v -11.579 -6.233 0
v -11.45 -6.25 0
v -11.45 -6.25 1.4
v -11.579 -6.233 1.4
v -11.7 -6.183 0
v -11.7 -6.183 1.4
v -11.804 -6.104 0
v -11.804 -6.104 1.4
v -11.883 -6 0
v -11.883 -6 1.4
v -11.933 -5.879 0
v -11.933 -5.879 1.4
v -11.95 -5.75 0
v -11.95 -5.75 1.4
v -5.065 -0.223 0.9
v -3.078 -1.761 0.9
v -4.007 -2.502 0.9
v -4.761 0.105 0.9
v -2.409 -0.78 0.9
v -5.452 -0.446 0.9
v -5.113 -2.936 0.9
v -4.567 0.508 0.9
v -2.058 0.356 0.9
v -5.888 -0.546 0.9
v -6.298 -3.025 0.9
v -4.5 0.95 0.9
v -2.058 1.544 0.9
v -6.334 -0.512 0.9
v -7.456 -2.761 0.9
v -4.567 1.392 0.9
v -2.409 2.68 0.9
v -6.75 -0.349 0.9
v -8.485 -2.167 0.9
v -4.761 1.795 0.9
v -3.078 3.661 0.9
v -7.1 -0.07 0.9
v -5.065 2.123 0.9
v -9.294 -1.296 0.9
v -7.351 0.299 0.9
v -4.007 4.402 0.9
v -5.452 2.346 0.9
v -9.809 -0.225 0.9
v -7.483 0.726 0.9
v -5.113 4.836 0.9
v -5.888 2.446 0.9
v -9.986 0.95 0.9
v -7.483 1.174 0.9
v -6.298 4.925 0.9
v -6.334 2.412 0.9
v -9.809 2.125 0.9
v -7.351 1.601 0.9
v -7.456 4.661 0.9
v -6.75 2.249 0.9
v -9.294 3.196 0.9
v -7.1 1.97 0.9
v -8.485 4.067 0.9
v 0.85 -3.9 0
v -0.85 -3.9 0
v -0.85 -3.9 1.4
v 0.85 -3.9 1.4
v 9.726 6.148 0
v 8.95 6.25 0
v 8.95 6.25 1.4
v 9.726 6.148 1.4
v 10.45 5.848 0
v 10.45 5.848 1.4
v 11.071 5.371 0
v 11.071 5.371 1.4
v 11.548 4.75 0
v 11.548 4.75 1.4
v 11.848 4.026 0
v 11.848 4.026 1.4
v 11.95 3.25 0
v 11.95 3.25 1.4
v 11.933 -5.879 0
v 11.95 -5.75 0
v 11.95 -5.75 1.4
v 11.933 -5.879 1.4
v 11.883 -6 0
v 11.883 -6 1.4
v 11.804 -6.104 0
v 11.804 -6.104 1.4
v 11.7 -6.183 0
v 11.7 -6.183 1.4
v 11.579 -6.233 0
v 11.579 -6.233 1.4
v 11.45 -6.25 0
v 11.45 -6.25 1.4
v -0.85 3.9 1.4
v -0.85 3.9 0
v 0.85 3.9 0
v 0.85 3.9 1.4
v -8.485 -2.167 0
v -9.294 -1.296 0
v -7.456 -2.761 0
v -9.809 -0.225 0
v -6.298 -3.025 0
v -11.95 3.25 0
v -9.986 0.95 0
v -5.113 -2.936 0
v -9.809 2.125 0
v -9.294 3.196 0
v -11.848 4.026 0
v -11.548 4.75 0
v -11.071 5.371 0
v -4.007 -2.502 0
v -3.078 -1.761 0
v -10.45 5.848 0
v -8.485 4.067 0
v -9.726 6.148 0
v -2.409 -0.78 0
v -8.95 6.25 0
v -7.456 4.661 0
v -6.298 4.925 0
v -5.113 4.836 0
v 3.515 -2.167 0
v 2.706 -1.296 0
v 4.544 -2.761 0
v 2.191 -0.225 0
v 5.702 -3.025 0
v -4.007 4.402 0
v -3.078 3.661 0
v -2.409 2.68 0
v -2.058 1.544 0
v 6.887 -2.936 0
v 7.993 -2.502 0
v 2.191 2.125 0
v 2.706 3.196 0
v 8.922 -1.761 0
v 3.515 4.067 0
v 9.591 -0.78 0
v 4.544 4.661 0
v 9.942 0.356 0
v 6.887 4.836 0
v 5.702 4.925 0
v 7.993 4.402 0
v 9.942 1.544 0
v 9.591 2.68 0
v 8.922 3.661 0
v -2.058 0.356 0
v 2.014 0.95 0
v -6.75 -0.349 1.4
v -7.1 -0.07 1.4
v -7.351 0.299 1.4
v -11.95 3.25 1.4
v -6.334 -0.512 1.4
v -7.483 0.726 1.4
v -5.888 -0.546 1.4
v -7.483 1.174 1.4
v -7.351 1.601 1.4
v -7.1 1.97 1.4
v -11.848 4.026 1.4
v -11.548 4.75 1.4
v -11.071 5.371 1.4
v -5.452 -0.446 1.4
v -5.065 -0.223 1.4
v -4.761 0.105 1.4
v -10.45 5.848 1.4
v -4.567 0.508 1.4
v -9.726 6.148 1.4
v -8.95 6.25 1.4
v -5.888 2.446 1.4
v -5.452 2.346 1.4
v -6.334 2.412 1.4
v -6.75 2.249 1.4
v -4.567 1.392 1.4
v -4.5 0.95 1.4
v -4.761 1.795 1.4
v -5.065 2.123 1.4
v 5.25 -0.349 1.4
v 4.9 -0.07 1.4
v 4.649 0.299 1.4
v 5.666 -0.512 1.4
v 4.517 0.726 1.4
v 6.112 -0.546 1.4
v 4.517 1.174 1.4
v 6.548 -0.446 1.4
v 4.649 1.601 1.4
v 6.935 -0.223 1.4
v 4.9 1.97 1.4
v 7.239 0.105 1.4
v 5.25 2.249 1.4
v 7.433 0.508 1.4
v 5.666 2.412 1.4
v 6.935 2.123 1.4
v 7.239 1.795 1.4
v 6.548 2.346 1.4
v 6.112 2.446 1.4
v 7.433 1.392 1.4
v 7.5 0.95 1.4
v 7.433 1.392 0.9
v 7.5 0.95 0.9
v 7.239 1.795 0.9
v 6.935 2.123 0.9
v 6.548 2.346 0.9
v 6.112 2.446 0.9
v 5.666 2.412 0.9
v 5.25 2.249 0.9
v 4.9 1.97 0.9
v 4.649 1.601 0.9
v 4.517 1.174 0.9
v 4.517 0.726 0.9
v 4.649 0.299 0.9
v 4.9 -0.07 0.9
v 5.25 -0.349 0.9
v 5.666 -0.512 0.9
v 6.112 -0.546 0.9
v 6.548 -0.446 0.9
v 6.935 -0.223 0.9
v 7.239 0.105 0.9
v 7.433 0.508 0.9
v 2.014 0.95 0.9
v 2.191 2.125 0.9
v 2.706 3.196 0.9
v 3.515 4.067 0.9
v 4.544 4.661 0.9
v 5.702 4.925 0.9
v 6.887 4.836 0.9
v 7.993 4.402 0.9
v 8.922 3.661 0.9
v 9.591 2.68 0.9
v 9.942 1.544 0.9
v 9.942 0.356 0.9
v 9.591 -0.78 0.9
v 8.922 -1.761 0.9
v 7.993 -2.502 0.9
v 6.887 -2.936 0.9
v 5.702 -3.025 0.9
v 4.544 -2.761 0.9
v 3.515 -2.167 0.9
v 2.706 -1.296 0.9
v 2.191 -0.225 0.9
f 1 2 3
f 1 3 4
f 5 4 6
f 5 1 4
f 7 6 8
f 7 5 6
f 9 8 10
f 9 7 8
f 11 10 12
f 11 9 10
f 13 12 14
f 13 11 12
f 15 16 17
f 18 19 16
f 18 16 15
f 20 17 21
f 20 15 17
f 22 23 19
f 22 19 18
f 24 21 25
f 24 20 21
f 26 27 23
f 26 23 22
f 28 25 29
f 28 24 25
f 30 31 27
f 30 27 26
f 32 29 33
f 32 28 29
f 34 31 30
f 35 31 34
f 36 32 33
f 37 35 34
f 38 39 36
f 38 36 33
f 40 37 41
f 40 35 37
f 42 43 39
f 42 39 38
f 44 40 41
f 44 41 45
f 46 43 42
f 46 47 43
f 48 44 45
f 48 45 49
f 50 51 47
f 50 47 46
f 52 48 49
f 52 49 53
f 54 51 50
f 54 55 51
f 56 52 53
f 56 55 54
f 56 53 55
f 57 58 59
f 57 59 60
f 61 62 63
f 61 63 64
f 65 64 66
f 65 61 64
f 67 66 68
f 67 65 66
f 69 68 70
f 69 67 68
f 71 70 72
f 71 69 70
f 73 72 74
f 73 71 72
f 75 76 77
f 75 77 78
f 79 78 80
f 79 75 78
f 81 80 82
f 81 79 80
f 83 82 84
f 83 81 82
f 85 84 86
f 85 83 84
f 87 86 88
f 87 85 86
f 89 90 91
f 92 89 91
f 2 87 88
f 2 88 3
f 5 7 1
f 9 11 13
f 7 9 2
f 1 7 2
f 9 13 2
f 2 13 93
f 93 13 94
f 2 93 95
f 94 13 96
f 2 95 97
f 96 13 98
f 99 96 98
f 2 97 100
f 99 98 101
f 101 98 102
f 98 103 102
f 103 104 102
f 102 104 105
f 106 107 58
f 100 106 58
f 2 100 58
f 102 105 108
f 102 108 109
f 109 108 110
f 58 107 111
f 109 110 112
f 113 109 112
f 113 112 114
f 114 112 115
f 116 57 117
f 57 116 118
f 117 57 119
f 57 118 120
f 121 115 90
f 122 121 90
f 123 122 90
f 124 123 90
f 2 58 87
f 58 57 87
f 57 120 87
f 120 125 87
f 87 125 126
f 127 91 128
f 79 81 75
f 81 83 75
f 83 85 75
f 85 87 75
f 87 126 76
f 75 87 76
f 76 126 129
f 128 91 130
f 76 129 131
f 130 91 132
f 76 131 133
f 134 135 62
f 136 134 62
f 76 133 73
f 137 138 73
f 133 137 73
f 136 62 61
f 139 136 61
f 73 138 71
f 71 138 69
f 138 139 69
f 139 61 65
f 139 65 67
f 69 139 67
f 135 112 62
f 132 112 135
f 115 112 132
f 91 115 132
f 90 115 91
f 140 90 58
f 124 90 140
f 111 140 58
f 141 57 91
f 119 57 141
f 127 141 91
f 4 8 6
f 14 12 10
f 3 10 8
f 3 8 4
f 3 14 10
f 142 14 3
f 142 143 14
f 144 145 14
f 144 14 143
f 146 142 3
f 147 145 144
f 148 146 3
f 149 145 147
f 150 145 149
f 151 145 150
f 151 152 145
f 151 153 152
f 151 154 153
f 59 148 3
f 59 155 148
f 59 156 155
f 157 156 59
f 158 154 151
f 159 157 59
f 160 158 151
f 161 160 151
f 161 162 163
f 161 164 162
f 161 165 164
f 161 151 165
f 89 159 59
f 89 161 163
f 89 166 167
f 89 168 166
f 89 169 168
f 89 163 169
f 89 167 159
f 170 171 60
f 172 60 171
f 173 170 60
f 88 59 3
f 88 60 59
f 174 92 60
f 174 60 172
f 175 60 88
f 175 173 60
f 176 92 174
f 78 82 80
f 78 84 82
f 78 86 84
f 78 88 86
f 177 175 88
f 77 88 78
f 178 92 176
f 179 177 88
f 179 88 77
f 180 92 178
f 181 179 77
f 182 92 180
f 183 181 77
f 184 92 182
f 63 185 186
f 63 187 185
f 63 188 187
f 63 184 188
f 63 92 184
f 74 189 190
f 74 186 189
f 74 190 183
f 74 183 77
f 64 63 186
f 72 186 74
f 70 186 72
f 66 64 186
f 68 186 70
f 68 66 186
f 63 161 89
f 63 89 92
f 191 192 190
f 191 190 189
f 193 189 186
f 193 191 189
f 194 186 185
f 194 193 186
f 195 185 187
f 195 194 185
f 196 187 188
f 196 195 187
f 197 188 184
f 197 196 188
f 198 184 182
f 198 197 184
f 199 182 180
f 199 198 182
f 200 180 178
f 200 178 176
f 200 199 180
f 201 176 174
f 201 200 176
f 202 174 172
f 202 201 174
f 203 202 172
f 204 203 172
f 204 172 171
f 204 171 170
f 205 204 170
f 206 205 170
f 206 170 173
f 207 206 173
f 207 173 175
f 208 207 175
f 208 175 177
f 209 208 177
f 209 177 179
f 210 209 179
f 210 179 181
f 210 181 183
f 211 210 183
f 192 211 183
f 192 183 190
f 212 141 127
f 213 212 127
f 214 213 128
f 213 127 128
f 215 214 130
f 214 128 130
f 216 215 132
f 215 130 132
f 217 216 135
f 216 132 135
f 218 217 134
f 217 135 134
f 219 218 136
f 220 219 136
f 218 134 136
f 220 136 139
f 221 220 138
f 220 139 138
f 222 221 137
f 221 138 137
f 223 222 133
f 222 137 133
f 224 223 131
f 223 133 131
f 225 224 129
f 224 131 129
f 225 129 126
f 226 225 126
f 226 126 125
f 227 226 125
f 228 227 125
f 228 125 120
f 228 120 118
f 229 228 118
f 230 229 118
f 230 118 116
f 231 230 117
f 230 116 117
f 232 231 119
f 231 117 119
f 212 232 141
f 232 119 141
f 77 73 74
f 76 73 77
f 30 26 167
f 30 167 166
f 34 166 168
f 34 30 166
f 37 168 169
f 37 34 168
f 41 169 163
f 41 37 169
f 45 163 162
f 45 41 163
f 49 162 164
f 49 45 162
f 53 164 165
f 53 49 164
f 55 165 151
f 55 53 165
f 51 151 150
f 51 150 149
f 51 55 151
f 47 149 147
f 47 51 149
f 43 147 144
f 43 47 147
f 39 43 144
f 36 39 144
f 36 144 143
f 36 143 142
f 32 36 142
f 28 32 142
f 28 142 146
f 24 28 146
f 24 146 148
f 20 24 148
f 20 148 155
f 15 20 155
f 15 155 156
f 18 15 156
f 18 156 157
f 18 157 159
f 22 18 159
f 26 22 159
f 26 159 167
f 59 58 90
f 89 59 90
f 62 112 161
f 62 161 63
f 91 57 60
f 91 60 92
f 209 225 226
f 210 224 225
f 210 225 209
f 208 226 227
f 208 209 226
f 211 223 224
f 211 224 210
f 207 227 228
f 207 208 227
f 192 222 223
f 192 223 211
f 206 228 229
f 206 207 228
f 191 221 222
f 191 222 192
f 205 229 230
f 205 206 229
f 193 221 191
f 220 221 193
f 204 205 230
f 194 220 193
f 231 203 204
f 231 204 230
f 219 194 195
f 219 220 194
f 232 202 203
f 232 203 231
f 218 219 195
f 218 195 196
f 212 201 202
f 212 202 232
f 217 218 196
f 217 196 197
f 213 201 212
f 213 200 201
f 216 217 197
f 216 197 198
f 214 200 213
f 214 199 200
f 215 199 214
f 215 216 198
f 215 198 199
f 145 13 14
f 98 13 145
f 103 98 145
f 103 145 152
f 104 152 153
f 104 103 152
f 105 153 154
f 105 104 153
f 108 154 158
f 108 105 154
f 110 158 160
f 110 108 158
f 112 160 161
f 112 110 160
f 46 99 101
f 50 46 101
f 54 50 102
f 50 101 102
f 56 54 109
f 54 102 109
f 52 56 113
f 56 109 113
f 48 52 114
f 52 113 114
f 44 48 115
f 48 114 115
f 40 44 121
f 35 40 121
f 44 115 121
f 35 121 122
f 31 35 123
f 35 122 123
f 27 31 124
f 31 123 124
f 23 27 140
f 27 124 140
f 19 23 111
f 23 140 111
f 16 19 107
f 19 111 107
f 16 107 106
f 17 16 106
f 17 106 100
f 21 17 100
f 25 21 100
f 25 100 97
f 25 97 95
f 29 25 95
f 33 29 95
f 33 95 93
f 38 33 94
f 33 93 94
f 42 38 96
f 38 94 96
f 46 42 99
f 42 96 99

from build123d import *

# Parameters (mm, degrees)
SKICA1_W                 = 1.7
SKICA1_H                 = 7.8
SKICA1_R                 = 1.5
P_IDAT_VYSUNUT_M3_DEPTH  = 1.4
SKICA3_R                 = 3.986213299
ODEBRAT_VYSUNUT_M1_DEPTH = 0.9


with BuildPart() as part:
    # Skica1 → Přidat vysunutím3 (new body)
    with BuildSketch(Plane.XY):
        with BuildLine():
            Line((-11.45, -6.25), (11.45, -6.25))
            ThreePointArc((11.45, -6.25), (11.803553391, -6.103553391), (11.95, -5.75))
            Line((11.95, -5.75), (11.95, 3.25))
            ThreePointArc((11.95, 3.25), (11.071320344, 5.371320344), (8.95, 6.25))
            Line((8.95, 6.25), (-8.95, 6.25))
            ThreePointArc((-8.95, 6.25), (-11.071320344, 5.371320344), (-11.95, 3.25))
            Line((-11.95, 3.25), (-11.95, -5.75))
            ThreePointArc((-11.95, -5.75), (-11.803553391, -6.103553391), (-11.45, -6.25))
        make_face()
        Rectangle(SKICA1_W, SKICA1_H, mode=Mode.SUBTRACT)
        with Locations((-6, 0.95)):
            Circle(SKICA1_R, mode=Mode.SUBTRACT)
        with Locations((6, 0.95)):
            Circle(SKICA1_R, mode=Mode.SUBTRACT)
    extrude(amount=P_IDAT_VYSUNUT_M3_DEPTH)

    # Skica3 → Odebrat vysunutím1 (cut)
    with BuildSketch(Plane(origin=(0, 0, 0), x_dir=(-1, 0, 0), z_dir=(0, 0, -1))):
        with Locations((-6, 0.95)):
            Circle(SKICA3_R)
        with Locations((6, 0.95)):
            Circle(SKICA3_R)
    extrude(amount=-ODEBRAT_VYSUNUT_M1_DEPTH, mode=Mode.SUBTRACT)


solid = part.part
